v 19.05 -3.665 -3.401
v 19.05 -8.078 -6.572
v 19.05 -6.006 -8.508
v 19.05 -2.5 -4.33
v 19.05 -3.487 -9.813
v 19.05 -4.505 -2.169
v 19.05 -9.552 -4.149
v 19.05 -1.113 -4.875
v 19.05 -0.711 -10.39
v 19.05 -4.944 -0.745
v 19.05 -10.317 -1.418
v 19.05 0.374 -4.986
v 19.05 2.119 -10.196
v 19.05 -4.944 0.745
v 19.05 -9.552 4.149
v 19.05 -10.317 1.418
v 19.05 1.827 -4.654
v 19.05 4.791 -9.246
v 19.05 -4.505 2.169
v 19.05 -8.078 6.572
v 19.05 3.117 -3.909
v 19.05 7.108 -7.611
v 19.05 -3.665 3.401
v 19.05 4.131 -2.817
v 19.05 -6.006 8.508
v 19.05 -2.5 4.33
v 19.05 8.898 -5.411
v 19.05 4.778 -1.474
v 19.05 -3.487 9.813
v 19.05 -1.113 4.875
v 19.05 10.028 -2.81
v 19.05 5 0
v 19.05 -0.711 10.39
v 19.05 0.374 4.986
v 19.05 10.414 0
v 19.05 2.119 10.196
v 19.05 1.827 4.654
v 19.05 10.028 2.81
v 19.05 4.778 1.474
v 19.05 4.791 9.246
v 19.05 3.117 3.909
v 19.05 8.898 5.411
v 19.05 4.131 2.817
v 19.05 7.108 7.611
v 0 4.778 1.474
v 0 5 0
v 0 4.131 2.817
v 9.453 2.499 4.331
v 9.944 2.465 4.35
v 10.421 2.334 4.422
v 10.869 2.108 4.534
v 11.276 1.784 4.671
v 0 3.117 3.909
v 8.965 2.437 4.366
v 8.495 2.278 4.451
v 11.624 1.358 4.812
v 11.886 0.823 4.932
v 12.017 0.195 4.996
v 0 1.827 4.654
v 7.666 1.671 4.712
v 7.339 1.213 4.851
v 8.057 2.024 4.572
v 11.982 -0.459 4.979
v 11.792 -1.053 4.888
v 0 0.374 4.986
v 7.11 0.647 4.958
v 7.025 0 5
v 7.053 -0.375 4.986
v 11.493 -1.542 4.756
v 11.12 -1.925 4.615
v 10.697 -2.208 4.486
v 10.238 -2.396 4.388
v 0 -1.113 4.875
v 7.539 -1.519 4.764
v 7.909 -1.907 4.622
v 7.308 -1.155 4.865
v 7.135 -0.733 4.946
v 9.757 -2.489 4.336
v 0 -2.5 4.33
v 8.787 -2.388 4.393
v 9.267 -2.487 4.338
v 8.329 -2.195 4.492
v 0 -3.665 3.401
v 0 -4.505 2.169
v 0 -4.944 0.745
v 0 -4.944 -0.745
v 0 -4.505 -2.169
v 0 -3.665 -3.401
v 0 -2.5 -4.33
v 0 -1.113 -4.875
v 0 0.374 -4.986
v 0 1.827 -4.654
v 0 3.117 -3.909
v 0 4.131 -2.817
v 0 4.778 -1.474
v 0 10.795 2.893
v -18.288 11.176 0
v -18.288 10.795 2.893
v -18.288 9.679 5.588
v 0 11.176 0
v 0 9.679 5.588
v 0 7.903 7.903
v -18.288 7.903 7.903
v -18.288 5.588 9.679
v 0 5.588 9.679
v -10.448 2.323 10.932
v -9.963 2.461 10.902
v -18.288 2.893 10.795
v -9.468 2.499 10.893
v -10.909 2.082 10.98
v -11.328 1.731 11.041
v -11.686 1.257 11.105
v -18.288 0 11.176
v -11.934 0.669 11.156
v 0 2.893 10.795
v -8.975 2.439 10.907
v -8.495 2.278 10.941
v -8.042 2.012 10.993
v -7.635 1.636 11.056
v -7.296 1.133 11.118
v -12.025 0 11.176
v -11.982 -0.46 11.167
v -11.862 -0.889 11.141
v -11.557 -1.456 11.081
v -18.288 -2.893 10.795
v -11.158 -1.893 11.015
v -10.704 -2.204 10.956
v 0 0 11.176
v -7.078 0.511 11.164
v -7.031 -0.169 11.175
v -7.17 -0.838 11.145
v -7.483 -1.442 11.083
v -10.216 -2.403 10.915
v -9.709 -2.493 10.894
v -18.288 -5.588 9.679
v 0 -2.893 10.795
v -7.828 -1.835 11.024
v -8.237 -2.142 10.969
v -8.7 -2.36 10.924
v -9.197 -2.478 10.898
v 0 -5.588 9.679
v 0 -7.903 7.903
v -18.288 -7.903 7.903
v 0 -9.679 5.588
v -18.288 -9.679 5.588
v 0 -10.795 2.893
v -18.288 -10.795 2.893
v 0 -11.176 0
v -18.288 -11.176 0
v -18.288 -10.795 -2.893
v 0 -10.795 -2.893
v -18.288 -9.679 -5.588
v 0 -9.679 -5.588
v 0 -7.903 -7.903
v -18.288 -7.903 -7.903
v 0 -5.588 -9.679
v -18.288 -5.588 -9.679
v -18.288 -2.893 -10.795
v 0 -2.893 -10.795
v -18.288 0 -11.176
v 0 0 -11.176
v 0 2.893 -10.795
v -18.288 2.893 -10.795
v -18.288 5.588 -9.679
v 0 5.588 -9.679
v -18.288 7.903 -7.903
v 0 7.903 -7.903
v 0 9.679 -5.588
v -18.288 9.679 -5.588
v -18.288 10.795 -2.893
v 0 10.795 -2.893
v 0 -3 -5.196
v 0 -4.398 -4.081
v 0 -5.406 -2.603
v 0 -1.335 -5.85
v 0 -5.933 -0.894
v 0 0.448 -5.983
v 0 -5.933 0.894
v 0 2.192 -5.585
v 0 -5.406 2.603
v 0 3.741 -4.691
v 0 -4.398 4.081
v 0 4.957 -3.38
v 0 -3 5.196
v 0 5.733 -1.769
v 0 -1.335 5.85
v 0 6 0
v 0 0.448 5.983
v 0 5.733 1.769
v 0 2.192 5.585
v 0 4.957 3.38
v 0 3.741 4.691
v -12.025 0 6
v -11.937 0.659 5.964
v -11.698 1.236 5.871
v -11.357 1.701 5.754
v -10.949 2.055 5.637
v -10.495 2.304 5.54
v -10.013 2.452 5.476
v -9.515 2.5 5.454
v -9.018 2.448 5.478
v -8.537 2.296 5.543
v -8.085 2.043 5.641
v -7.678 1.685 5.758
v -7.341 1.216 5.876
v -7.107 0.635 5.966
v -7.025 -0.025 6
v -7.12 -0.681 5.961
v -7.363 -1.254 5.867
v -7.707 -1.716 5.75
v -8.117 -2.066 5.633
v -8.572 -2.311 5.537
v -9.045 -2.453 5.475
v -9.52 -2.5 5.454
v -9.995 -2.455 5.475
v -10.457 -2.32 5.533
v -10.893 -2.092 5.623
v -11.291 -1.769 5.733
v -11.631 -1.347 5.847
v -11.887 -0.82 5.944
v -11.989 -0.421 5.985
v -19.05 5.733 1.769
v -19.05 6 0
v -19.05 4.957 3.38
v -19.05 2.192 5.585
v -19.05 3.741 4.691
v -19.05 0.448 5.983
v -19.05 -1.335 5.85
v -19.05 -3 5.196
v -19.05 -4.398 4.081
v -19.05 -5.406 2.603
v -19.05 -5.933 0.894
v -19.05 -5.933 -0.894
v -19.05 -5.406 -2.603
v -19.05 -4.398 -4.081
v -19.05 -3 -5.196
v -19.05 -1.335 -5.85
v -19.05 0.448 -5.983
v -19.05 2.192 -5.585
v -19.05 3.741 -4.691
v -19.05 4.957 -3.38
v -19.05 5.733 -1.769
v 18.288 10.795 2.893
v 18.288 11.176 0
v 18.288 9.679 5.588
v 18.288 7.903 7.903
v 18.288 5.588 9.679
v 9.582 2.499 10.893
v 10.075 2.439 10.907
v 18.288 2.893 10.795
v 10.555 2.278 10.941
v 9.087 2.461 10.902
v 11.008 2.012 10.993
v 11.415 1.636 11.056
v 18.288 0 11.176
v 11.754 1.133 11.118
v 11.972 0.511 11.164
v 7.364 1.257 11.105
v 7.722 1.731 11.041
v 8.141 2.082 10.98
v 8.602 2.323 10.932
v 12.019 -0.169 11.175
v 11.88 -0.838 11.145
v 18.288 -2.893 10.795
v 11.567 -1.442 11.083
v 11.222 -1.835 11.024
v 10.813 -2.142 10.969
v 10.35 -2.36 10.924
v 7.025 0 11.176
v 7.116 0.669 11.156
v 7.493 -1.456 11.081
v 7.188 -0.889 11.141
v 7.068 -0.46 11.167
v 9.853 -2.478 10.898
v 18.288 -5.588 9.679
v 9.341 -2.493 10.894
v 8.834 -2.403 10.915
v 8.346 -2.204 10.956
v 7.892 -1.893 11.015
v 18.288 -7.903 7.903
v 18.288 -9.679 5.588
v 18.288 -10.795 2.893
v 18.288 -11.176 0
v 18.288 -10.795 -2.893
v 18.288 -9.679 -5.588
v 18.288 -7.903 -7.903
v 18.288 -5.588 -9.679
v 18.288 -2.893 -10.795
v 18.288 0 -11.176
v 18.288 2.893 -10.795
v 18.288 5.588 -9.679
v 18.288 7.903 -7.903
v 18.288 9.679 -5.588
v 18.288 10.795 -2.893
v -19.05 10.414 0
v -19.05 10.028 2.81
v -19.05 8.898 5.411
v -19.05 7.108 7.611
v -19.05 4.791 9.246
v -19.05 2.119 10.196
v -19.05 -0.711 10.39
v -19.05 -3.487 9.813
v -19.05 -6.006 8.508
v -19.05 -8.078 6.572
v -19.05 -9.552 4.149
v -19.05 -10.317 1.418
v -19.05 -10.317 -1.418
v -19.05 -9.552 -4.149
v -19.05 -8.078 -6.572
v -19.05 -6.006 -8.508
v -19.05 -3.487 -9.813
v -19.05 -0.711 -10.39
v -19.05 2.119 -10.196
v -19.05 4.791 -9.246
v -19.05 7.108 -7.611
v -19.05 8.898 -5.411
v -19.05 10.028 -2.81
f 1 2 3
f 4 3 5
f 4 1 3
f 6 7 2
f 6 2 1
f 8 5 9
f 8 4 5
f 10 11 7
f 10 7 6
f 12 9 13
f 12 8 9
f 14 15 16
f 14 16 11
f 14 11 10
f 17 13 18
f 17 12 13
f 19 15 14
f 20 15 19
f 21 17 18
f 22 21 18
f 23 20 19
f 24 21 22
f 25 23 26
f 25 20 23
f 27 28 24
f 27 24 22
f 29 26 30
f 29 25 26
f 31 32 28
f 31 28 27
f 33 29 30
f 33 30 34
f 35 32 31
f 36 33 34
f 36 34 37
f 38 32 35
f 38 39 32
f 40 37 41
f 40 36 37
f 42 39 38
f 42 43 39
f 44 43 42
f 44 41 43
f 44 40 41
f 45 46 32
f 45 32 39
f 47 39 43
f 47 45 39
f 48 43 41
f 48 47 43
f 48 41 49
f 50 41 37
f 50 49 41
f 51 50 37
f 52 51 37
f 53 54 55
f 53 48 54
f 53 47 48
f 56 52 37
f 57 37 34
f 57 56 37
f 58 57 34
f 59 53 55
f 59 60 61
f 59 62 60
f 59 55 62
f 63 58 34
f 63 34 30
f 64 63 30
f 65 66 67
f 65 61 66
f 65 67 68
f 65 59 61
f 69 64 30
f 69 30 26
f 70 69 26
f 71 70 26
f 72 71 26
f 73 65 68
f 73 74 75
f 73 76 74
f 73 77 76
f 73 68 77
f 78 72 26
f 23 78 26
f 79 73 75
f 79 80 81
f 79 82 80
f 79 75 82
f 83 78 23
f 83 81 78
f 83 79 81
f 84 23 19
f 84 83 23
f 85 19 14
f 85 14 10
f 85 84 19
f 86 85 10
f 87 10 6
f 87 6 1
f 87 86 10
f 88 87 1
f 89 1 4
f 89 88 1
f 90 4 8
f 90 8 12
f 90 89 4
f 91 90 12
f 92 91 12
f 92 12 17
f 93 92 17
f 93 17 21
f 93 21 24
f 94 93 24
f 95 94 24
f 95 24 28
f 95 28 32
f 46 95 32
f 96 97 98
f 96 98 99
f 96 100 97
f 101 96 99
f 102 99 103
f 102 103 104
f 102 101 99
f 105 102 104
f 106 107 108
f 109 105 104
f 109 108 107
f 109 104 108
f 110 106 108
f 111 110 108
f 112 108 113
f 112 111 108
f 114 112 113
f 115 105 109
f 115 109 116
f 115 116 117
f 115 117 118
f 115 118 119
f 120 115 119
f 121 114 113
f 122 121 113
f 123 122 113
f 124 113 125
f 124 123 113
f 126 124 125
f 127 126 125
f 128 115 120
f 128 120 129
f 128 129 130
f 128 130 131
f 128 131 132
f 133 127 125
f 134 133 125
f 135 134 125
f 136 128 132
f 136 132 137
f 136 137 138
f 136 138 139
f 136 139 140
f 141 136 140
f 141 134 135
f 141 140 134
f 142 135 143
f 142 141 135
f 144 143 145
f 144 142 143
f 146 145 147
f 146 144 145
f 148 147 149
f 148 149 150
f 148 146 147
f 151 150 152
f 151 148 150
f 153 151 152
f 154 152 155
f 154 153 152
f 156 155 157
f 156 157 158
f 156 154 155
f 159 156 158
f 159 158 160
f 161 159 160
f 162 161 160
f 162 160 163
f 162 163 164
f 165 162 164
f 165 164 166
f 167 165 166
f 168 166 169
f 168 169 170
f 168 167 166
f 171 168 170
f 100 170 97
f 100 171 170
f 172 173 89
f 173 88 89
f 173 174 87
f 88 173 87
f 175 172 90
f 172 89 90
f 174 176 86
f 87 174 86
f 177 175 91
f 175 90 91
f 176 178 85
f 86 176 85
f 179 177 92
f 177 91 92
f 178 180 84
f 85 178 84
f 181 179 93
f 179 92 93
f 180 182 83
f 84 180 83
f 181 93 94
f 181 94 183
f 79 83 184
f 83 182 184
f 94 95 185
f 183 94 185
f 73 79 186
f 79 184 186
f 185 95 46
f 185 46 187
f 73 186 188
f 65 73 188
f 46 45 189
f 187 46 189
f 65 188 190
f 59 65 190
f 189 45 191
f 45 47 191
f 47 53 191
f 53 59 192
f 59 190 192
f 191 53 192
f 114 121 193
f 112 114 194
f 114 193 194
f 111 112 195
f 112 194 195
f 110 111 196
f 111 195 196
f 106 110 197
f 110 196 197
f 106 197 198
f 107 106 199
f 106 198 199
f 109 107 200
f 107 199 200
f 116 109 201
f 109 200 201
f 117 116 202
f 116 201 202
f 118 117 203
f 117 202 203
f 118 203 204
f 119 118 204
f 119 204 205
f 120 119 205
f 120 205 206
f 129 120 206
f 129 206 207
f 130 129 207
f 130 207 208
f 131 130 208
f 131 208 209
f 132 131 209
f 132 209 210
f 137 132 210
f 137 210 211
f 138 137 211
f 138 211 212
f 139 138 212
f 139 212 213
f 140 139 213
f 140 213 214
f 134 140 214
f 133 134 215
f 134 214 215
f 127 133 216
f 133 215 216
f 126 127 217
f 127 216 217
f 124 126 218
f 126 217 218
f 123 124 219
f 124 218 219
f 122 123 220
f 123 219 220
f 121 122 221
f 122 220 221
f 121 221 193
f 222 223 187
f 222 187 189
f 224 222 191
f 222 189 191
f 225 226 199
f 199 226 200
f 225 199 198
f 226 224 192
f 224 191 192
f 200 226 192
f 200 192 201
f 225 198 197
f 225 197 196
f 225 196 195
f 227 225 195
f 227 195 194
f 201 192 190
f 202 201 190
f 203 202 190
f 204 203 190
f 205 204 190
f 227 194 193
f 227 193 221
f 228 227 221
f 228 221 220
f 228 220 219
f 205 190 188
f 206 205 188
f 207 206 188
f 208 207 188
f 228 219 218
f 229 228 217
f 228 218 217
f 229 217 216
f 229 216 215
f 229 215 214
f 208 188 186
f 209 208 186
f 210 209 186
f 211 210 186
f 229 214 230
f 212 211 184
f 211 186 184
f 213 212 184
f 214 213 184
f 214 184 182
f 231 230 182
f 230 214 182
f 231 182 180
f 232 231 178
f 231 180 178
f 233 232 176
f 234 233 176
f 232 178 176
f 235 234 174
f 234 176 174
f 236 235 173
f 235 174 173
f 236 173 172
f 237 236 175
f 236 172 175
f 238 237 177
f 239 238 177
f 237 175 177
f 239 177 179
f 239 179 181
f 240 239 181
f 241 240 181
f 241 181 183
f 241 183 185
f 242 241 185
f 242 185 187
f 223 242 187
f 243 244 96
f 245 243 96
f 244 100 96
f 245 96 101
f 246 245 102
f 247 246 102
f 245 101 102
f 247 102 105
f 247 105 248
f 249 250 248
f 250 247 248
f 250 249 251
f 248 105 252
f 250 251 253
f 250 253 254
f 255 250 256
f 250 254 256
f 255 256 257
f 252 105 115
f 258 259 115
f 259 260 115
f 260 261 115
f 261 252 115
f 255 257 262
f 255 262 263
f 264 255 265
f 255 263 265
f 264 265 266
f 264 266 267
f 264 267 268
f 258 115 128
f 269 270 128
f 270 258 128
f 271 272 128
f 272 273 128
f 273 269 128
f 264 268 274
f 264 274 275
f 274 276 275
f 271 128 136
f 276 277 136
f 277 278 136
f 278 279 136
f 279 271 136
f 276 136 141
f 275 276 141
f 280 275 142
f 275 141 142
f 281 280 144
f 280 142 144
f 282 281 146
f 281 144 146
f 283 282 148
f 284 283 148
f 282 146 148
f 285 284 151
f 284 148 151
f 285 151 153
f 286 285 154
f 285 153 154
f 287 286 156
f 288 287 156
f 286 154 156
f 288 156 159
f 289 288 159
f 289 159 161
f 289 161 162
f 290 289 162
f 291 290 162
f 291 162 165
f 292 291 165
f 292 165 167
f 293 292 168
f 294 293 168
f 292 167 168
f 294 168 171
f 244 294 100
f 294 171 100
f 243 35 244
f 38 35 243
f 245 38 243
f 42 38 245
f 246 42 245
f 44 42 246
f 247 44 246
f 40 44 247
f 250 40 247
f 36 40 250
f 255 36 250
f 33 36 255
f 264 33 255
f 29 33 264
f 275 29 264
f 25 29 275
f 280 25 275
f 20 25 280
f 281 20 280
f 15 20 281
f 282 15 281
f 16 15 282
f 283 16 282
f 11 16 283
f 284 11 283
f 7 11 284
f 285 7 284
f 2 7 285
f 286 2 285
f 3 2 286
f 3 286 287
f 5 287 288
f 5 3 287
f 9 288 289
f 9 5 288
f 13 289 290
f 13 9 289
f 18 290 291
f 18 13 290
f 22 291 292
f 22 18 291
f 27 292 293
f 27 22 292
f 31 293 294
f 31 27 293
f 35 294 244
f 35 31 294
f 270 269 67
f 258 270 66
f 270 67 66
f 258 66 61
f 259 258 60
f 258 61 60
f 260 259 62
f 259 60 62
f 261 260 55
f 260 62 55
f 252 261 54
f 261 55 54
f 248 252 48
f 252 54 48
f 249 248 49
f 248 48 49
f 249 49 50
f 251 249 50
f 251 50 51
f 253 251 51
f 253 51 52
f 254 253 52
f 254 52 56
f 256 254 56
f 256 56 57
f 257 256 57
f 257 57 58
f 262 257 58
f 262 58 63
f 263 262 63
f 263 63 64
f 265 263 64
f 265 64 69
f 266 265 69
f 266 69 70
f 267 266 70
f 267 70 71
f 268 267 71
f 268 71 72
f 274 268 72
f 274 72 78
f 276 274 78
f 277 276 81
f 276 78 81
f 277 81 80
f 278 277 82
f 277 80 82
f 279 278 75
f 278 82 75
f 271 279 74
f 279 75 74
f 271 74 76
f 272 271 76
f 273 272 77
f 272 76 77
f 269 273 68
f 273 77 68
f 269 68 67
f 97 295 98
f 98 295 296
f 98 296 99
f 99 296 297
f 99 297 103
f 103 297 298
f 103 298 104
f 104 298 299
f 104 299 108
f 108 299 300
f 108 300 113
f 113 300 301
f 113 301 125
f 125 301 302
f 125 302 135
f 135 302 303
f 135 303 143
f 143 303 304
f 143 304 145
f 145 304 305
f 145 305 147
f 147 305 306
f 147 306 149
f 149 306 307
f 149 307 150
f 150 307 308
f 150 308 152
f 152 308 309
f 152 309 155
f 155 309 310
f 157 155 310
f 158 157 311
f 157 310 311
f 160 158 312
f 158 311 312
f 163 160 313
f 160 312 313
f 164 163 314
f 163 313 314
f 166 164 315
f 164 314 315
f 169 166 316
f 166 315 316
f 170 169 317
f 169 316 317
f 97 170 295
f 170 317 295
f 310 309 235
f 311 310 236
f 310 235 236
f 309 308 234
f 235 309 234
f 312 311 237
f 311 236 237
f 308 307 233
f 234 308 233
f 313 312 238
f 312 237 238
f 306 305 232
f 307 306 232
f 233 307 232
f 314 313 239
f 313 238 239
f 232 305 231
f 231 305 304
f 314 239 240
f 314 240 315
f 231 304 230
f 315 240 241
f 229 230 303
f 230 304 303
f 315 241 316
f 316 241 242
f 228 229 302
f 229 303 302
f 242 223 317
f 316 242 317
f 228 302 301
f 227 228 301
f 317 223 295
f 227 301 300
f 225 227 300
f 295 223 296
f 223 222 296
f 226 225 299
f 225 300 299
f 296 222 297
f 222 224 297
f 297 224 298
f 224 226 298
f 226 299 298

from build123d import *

# Parameters (mm, degrees)
F0_R     = 11.176
F0_R_2   = 6
F1_DEPTH = 19.05
F2_R     = 11.176
F2_R_2   = 5
F3_DEPTH = 19.05
F4_SIZE  = 0.762
F7_D     = 5
F7_DEPTH = 12.7
F7_START = 0.2832054
F7_TIP   = 1.5021515476


with BuildPart() as f1:
    # F0 (on Right) → F1 (new body)
    with BuildSketch(Plane.YZ):
        Circle(F0_R)
        Circle(F0_R_2, mode=Mode.SUBTRACT)
    extrude(amount=-F1_DEPTH)

    # F2 (on Right) → F3 (join)
    with BuildSketch(Plane.YZ):
        Circle(F2_R)
        Circle(F2_R_2, mode=Mode.SUBTRACT)
    extrude(amount=F3_DEPTH)

    # F4
    f4_edges = [f1.edges().sort_by_distance(p)[0] for p in [
        (-19.05, -11.176, 0),
        (19.05, -11.176, 0),
    ]]
    chamfer(f4_edges, length=F4_SIZE)

    # F7
    # its depths count from where the whole tool has entered the part; down to there all is cleared
    with Locations(Plane.XY.offset(11.176).offset(-F7_START)):
        with Locations((-9.525, 0), (9.525, 0)):
            Hole(F7_D / 2, depth=F7_DEPTH)
            with Locations((0, 0, -(F7_DEPTH + F7_TIP / 2))):  # 118° drill point
                Cone(0, F7_D / 2, F7_TIP, mode=Mode.SUBTRACT)


solid = f1.part
